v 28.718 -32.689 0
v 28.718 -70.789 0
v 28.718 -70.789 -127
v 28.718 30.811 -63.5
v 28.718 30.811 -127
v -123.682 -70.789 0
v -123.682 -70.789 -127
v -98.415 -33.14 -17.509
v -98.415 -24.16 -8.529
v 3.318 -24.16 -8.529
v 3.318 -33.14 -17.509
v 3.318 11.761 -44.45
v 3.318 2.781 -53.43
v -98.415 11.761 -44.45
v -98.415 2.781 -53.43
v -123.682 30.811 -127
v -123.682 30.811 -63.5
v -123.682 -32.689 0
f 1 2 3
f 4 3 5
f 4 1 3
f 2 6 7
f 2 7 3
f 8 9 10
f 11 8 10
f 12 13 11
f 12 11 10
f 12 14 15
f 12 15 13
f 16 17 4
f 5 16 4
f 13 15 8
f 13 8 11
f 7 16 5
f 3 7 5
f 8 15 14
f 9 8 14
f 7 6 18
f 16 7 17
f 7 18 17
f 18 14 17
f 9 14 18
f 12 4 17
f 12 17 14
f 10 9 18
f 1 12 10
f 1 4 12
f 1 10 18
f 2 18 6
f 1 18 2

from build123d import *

# Parameters (mm, degrees)
SKETCH1_W           = 152.4
SKETCH1_H           = 101.6
BOSS_EXTRUDE1_DEPTH = 127
CUT_EXTRUDE1_DEPTH  = 134.62
CUT_EXTRUDE2_DEPTH  = 134.62
SKETCH5_W           = 101.732493014
SKETCH5_H           = 12.7
CUT_EXTRUDE4_DEPTH  = 50.8


with BuildPart() as part:
    # Sketch1 → Boss-Extrude1 (new body)
    with BuildSketch(Plane.XY):
        with Locations((-47.482496627, -19.988512007)):
            Rectangle(SKETCH1_W, SKETCH1_H)
    extrude(amount=-BOSS_EXTRUDE1_DEPTH)

    # Sketch2 → Cut-Extrude1 (cut)
    with BuildSketch(Plane(origin=(0, 0, 0), x_dir=(0, 0, -1), z_dir=(1, 0, 0))):
        Polygon((0, 30.811487993), (0, -32.688512007), (63.5, 30.811487993), align=None)
    extrude(amount=CUT_EXTRUDE1_DEPTH, mode=Mode.SUBTRACT)

    # Sketch3 → Cut-Extrude2 (cut)
    with BuildSketch(Plane(origin=(0, 0, 0), x_dir=(0, 0, -1), z_dir=(1, 0, 0))):
        Polygon((0, -32.688512007), (0, 30.811487993), (63.5, 30.811487993), align=None)
    extrude(amount=-CUT_EXTRUDE2_DEPTH, mode=Mode.SUBTRACT)

    # Sketch5 → Cut-Extrude4 (cut)
    with BuildSketch(Plane(origin=(0, 28.105743997, -28.105743997), x_dir=(1, 0, 0), z_dir=(0, -0.7071067811865512, 0.7071067811865438))):
        with Locations((-47.548743134, -29.464268507)):
            Rectangle(SKETCH5_W, SKETCH5_H)
    extrude(amount=CUT_EXTRUDE4_DEPTH, mode=Mode.SUBTRACT)


solid = part.part
